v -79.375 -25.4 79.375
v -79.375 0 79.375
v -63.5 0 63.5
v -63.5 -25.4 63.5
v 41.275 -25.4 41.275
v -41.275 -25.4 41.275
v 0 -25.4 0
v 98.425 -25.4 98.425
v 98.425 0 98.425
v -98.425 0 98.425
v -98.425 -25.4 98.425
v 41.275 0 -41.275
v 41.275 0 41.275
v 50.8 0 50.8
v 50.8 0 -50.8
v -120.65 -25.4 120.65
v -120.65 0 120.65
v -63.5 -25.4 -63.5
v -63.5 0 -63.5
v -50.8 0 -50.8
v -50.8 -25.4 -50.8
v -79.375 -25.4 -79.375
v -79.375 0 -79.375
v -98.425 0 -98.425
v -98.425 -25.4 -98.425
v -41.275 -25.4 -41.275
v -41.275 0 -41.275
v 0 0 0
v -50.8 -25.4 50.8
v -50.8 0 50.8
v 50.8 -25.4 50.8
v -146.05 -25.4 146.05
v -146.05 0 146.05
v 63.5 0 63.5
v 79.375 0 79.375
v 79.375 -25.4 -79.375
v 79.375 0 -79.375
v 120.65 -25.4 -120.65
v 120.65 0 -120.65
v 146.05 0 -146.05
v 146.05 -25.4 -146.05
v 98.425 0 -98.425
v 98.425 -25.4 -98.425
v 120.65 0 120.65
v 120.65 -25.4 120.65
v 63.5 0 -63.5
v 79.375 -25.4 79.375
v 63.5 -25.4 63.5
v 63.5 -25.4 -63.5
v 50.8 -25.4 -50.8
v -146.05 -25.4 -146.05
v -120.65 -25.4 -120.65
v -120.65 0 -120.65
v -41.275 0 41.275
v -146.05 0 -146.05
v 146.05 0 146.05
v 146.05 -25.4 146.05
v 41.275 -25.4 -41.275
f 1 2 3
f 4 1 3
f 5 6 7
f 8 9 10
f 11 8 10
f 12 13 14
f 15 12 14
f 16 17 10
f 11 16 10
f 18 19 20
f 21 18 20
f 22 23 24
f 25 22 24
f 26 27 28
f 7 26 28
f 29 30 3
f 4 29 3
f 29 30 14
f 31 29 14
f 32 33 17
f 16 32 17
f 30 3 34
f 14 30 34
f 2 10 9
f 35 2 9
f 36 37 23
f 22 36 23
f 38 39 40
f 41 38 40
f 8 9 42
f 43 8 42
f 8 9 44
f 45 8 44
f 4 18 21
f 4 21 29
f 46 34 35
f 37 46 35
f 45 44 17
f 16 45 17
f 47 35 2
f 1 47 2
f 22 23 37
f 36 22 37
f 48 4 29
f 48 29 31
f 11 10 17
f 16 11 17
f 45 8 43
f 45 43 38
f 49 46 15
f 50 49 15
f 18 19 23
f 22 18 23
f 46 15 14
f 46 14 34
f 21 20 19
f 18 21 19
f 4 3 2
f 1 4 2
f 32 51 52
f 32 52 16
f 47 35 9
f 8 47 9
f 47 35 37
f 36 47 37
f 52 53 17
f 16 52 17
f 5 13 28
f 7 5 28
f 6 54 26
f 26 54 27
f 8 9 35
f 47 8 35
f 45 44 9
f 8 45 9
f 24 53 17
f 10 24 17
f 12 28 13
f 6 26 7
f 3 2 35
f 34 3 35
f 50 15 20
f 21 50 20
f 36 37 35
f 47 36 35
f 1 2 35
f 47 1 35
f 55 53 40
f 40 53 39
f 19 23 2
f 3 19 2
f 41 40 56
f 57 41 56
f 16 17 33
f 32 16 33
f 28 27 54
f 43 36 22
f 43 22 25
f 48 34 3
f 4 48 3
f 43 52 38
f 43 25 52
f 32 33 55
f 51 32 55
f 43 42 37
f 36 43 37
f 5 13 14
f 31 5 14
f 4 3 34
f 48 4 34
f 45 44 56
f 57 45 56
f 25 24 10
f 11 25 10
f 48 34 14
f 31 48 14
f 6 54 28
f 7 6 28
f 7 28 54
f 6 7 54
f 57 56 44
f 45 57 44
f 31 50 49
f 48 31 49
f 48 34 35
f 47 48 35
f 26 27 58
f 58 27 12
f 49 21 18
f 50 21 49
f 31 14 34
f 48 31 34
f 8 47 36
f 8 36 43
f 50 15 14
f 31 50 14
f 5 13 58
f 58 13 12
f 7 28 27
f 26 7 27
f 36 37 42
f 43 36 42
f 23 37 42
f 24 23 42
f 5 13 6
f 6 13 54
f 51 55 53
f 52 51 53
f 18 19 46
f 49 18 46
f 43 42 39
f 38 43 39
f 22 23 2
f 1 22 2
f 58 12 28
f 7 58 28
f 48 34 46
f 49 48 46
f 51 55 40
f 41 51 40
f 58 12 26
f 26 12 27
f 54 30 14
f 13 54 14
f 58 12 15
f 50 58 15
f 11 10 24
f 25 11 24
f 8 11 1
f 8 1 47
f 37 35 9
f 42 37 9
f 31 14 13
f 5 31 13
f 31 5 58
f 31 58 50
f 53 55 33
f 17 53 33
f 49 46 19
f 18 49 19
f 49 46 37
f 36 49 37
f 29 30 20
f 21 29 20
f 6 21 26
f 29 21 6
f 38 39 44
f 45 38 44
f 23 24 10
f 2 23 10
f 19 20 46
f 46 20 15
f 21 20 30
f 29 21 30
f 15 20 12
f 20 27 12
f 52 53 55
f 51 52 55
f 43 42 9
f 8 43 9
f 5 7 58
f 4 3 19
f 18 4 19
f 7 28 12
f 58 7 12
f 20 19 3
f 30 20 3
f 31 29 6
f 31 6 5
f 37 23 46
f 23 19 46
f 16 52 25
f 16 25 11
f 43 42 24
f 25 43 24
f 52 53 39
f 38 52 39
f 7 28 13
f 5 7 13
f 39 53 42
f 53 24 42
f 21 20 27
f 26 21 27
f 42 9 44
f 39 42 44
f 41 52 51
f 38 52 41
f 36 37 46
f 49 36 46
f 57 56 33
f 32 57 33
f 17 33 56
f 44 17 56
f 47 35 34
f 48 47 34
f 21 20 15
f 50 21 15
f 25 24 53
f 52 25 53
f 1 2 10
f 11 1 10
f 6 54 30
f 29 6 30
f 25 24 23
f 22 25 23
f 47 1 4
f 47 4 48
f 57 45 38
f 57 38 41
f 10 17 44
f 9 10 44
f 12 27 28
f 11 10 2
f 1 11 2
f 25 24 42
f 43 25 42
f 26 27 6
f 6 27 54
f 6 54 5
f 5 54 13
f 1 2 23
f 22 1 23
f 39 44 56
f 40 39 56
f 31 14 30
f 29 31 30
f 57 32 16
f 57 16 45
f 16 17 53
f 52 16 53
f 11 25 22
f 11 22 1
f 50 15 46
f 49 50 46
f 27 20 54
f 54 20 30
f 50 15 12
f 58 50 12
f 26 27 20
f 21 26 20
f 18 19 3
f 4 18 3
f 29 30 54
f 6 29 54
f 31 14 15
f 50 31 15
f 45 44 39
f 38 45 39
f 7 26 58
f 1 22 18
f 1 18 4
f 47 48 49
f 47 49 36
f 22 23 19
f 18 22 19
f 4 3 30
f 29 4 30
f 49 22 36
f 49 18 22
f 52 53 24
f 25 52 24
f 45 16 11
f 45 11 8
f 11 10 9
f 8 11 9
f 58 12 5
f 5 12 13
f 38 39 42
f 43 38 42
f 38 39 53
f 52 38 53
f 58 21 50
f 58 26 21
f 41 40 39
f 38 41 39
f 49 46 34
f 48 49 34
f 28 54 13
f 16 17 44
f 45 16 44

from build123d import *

# Parameters (mm, degrees)
F1_DEPTH = 25.4
F2_DEPTH = 25.4


with BuildPart() as f1:
    # F0 (on Front) → F1 (new body)
    with BuildSketch(Plane.XZ):
        Polygon((120.65, 120.65), (146.05, 146.05), (-146.05, 146.05), (-120.65, 120.65), align=None)
        Polygon((79.375, 79.375), (98.425, 98.425), (-98.425, 98.425), (-79.375, 79.375), align=None)
        Polygon((50.8, 50.8), (63.5, 63.5), (-63.5, 63.5), (-50.8, 50.8), align=None)
        Polygon((0, 0), (41.275, 41.275), (-41.275, 41.275), align=None)
        Polygon((-63.5, -63.5), (63.5, -63.5), (50.8, -50.8), (-50.8, -50.8), align=None)
        Polygon((-41.275, -41.275), (41.275, -41.275), (0, 0), align=None)
        Polygon((-98.425, -98.425), (98.425, -98.425), (79.375, -79.375), (-79.375, -79.375), align=None)
        Polygon((-146.05, -146.05), (146.05, -146.05), (120.65, -120.65), (-120.65, -120.65), align=None)
        Polygon((120.65, -120.65), (120.65, 120.65), (98.425, 98.425), (98.425, -98.425), align=None)
        Polygon((79.375, -79.375), (79.375, 79.375), (63.5, 63.5), (63.5, -63.5), align=None)
        Polygon((-63.5, 63.5), (-79.375, 79.375), (-79.375, -79.375), (-63.5, -63.5), align=None)
        Polygon((-98.425, 98.425), (-120.65, 120.65), (-120.65, -120.65), (-98.425, -98.425), align=None)
        Polygon((50.8, -50.8), (50.8, 50.8), (41.275, 41.275), (41.275, -41.275), align=None)
        Polygon((-41.275, 41.275), (-50.8, 50.8), (-50.8, -50.8), (-41.275, -41.275), align=None)
    extrude(amount=F1_DEPTH)


with BuildPart() as f2:
    # F0 (on Front) → F2 (new body)
    with BuildSketch(Plane.XZ):
        Polygon((98.425, 98.425), (120.65, 120.65), (-120.65, 120.65), (-98.425, 98.425), align=None)
        Polygon((-120.65, 120.65), (-146.05, 146.05), (-146.05, -146.05), (-120.65, -120.65), align=None)
        Polygon((146.05, -146.05), (146.05, 146.05), (120.65, 120.65), (120.65, -120.65), align=None)
        Polygon((98.425, -98.425), (98.425, 98.425), (79.375, 79.375), (79.375, -79.375), align=None)
        Polygon((63.5, 63.5), (79.375, 79.375), (-79.375, 79.375), (-63.5, 63.5), align=None)
        Polygon((-79.375, 79.375), (-98.425, 98.425), (-98.425, -98.425), (-79.375, -79.375), align=None)
        Polygon((-50.8, 50.8), (-63.5, 63.5), (-63.5, -63.5), (-50.8, -50.8), align=None)
        Polygon((41.275, 41.275), (50.8, 50.8), (-50.8, 50.8), (-41.275, 41.275), align=None)
        Polygon((63.5, -63.5), (63.5, 63.5), (50.8, 50.8), (50.8, -50.8), align=None)
        Polygon((41.275, -41.275), (41.275, 41.275), (0, 0), align=None)
        Polygon((0, 0), (-41.275, 41.275), (-41.275, -41.275), align=None)
        Polygon((-50.8, -50.8), (50.8, -50.8), (41.275, -41.275), (-41.275, -41.275), align=None)
        Polygon((-79.375, -79.375), (79.375, -79.375), (63.5, -63.5), (-63.5, -63.5), align=None)
        Polygon((-120.65, -120.65), (120.65, -120.65), (98.425, -98.425), (-98.425, -98.425), align=None)
    extrude(amount=F2_DEPTH)


solid = Compound([f1.part, f2.part])
